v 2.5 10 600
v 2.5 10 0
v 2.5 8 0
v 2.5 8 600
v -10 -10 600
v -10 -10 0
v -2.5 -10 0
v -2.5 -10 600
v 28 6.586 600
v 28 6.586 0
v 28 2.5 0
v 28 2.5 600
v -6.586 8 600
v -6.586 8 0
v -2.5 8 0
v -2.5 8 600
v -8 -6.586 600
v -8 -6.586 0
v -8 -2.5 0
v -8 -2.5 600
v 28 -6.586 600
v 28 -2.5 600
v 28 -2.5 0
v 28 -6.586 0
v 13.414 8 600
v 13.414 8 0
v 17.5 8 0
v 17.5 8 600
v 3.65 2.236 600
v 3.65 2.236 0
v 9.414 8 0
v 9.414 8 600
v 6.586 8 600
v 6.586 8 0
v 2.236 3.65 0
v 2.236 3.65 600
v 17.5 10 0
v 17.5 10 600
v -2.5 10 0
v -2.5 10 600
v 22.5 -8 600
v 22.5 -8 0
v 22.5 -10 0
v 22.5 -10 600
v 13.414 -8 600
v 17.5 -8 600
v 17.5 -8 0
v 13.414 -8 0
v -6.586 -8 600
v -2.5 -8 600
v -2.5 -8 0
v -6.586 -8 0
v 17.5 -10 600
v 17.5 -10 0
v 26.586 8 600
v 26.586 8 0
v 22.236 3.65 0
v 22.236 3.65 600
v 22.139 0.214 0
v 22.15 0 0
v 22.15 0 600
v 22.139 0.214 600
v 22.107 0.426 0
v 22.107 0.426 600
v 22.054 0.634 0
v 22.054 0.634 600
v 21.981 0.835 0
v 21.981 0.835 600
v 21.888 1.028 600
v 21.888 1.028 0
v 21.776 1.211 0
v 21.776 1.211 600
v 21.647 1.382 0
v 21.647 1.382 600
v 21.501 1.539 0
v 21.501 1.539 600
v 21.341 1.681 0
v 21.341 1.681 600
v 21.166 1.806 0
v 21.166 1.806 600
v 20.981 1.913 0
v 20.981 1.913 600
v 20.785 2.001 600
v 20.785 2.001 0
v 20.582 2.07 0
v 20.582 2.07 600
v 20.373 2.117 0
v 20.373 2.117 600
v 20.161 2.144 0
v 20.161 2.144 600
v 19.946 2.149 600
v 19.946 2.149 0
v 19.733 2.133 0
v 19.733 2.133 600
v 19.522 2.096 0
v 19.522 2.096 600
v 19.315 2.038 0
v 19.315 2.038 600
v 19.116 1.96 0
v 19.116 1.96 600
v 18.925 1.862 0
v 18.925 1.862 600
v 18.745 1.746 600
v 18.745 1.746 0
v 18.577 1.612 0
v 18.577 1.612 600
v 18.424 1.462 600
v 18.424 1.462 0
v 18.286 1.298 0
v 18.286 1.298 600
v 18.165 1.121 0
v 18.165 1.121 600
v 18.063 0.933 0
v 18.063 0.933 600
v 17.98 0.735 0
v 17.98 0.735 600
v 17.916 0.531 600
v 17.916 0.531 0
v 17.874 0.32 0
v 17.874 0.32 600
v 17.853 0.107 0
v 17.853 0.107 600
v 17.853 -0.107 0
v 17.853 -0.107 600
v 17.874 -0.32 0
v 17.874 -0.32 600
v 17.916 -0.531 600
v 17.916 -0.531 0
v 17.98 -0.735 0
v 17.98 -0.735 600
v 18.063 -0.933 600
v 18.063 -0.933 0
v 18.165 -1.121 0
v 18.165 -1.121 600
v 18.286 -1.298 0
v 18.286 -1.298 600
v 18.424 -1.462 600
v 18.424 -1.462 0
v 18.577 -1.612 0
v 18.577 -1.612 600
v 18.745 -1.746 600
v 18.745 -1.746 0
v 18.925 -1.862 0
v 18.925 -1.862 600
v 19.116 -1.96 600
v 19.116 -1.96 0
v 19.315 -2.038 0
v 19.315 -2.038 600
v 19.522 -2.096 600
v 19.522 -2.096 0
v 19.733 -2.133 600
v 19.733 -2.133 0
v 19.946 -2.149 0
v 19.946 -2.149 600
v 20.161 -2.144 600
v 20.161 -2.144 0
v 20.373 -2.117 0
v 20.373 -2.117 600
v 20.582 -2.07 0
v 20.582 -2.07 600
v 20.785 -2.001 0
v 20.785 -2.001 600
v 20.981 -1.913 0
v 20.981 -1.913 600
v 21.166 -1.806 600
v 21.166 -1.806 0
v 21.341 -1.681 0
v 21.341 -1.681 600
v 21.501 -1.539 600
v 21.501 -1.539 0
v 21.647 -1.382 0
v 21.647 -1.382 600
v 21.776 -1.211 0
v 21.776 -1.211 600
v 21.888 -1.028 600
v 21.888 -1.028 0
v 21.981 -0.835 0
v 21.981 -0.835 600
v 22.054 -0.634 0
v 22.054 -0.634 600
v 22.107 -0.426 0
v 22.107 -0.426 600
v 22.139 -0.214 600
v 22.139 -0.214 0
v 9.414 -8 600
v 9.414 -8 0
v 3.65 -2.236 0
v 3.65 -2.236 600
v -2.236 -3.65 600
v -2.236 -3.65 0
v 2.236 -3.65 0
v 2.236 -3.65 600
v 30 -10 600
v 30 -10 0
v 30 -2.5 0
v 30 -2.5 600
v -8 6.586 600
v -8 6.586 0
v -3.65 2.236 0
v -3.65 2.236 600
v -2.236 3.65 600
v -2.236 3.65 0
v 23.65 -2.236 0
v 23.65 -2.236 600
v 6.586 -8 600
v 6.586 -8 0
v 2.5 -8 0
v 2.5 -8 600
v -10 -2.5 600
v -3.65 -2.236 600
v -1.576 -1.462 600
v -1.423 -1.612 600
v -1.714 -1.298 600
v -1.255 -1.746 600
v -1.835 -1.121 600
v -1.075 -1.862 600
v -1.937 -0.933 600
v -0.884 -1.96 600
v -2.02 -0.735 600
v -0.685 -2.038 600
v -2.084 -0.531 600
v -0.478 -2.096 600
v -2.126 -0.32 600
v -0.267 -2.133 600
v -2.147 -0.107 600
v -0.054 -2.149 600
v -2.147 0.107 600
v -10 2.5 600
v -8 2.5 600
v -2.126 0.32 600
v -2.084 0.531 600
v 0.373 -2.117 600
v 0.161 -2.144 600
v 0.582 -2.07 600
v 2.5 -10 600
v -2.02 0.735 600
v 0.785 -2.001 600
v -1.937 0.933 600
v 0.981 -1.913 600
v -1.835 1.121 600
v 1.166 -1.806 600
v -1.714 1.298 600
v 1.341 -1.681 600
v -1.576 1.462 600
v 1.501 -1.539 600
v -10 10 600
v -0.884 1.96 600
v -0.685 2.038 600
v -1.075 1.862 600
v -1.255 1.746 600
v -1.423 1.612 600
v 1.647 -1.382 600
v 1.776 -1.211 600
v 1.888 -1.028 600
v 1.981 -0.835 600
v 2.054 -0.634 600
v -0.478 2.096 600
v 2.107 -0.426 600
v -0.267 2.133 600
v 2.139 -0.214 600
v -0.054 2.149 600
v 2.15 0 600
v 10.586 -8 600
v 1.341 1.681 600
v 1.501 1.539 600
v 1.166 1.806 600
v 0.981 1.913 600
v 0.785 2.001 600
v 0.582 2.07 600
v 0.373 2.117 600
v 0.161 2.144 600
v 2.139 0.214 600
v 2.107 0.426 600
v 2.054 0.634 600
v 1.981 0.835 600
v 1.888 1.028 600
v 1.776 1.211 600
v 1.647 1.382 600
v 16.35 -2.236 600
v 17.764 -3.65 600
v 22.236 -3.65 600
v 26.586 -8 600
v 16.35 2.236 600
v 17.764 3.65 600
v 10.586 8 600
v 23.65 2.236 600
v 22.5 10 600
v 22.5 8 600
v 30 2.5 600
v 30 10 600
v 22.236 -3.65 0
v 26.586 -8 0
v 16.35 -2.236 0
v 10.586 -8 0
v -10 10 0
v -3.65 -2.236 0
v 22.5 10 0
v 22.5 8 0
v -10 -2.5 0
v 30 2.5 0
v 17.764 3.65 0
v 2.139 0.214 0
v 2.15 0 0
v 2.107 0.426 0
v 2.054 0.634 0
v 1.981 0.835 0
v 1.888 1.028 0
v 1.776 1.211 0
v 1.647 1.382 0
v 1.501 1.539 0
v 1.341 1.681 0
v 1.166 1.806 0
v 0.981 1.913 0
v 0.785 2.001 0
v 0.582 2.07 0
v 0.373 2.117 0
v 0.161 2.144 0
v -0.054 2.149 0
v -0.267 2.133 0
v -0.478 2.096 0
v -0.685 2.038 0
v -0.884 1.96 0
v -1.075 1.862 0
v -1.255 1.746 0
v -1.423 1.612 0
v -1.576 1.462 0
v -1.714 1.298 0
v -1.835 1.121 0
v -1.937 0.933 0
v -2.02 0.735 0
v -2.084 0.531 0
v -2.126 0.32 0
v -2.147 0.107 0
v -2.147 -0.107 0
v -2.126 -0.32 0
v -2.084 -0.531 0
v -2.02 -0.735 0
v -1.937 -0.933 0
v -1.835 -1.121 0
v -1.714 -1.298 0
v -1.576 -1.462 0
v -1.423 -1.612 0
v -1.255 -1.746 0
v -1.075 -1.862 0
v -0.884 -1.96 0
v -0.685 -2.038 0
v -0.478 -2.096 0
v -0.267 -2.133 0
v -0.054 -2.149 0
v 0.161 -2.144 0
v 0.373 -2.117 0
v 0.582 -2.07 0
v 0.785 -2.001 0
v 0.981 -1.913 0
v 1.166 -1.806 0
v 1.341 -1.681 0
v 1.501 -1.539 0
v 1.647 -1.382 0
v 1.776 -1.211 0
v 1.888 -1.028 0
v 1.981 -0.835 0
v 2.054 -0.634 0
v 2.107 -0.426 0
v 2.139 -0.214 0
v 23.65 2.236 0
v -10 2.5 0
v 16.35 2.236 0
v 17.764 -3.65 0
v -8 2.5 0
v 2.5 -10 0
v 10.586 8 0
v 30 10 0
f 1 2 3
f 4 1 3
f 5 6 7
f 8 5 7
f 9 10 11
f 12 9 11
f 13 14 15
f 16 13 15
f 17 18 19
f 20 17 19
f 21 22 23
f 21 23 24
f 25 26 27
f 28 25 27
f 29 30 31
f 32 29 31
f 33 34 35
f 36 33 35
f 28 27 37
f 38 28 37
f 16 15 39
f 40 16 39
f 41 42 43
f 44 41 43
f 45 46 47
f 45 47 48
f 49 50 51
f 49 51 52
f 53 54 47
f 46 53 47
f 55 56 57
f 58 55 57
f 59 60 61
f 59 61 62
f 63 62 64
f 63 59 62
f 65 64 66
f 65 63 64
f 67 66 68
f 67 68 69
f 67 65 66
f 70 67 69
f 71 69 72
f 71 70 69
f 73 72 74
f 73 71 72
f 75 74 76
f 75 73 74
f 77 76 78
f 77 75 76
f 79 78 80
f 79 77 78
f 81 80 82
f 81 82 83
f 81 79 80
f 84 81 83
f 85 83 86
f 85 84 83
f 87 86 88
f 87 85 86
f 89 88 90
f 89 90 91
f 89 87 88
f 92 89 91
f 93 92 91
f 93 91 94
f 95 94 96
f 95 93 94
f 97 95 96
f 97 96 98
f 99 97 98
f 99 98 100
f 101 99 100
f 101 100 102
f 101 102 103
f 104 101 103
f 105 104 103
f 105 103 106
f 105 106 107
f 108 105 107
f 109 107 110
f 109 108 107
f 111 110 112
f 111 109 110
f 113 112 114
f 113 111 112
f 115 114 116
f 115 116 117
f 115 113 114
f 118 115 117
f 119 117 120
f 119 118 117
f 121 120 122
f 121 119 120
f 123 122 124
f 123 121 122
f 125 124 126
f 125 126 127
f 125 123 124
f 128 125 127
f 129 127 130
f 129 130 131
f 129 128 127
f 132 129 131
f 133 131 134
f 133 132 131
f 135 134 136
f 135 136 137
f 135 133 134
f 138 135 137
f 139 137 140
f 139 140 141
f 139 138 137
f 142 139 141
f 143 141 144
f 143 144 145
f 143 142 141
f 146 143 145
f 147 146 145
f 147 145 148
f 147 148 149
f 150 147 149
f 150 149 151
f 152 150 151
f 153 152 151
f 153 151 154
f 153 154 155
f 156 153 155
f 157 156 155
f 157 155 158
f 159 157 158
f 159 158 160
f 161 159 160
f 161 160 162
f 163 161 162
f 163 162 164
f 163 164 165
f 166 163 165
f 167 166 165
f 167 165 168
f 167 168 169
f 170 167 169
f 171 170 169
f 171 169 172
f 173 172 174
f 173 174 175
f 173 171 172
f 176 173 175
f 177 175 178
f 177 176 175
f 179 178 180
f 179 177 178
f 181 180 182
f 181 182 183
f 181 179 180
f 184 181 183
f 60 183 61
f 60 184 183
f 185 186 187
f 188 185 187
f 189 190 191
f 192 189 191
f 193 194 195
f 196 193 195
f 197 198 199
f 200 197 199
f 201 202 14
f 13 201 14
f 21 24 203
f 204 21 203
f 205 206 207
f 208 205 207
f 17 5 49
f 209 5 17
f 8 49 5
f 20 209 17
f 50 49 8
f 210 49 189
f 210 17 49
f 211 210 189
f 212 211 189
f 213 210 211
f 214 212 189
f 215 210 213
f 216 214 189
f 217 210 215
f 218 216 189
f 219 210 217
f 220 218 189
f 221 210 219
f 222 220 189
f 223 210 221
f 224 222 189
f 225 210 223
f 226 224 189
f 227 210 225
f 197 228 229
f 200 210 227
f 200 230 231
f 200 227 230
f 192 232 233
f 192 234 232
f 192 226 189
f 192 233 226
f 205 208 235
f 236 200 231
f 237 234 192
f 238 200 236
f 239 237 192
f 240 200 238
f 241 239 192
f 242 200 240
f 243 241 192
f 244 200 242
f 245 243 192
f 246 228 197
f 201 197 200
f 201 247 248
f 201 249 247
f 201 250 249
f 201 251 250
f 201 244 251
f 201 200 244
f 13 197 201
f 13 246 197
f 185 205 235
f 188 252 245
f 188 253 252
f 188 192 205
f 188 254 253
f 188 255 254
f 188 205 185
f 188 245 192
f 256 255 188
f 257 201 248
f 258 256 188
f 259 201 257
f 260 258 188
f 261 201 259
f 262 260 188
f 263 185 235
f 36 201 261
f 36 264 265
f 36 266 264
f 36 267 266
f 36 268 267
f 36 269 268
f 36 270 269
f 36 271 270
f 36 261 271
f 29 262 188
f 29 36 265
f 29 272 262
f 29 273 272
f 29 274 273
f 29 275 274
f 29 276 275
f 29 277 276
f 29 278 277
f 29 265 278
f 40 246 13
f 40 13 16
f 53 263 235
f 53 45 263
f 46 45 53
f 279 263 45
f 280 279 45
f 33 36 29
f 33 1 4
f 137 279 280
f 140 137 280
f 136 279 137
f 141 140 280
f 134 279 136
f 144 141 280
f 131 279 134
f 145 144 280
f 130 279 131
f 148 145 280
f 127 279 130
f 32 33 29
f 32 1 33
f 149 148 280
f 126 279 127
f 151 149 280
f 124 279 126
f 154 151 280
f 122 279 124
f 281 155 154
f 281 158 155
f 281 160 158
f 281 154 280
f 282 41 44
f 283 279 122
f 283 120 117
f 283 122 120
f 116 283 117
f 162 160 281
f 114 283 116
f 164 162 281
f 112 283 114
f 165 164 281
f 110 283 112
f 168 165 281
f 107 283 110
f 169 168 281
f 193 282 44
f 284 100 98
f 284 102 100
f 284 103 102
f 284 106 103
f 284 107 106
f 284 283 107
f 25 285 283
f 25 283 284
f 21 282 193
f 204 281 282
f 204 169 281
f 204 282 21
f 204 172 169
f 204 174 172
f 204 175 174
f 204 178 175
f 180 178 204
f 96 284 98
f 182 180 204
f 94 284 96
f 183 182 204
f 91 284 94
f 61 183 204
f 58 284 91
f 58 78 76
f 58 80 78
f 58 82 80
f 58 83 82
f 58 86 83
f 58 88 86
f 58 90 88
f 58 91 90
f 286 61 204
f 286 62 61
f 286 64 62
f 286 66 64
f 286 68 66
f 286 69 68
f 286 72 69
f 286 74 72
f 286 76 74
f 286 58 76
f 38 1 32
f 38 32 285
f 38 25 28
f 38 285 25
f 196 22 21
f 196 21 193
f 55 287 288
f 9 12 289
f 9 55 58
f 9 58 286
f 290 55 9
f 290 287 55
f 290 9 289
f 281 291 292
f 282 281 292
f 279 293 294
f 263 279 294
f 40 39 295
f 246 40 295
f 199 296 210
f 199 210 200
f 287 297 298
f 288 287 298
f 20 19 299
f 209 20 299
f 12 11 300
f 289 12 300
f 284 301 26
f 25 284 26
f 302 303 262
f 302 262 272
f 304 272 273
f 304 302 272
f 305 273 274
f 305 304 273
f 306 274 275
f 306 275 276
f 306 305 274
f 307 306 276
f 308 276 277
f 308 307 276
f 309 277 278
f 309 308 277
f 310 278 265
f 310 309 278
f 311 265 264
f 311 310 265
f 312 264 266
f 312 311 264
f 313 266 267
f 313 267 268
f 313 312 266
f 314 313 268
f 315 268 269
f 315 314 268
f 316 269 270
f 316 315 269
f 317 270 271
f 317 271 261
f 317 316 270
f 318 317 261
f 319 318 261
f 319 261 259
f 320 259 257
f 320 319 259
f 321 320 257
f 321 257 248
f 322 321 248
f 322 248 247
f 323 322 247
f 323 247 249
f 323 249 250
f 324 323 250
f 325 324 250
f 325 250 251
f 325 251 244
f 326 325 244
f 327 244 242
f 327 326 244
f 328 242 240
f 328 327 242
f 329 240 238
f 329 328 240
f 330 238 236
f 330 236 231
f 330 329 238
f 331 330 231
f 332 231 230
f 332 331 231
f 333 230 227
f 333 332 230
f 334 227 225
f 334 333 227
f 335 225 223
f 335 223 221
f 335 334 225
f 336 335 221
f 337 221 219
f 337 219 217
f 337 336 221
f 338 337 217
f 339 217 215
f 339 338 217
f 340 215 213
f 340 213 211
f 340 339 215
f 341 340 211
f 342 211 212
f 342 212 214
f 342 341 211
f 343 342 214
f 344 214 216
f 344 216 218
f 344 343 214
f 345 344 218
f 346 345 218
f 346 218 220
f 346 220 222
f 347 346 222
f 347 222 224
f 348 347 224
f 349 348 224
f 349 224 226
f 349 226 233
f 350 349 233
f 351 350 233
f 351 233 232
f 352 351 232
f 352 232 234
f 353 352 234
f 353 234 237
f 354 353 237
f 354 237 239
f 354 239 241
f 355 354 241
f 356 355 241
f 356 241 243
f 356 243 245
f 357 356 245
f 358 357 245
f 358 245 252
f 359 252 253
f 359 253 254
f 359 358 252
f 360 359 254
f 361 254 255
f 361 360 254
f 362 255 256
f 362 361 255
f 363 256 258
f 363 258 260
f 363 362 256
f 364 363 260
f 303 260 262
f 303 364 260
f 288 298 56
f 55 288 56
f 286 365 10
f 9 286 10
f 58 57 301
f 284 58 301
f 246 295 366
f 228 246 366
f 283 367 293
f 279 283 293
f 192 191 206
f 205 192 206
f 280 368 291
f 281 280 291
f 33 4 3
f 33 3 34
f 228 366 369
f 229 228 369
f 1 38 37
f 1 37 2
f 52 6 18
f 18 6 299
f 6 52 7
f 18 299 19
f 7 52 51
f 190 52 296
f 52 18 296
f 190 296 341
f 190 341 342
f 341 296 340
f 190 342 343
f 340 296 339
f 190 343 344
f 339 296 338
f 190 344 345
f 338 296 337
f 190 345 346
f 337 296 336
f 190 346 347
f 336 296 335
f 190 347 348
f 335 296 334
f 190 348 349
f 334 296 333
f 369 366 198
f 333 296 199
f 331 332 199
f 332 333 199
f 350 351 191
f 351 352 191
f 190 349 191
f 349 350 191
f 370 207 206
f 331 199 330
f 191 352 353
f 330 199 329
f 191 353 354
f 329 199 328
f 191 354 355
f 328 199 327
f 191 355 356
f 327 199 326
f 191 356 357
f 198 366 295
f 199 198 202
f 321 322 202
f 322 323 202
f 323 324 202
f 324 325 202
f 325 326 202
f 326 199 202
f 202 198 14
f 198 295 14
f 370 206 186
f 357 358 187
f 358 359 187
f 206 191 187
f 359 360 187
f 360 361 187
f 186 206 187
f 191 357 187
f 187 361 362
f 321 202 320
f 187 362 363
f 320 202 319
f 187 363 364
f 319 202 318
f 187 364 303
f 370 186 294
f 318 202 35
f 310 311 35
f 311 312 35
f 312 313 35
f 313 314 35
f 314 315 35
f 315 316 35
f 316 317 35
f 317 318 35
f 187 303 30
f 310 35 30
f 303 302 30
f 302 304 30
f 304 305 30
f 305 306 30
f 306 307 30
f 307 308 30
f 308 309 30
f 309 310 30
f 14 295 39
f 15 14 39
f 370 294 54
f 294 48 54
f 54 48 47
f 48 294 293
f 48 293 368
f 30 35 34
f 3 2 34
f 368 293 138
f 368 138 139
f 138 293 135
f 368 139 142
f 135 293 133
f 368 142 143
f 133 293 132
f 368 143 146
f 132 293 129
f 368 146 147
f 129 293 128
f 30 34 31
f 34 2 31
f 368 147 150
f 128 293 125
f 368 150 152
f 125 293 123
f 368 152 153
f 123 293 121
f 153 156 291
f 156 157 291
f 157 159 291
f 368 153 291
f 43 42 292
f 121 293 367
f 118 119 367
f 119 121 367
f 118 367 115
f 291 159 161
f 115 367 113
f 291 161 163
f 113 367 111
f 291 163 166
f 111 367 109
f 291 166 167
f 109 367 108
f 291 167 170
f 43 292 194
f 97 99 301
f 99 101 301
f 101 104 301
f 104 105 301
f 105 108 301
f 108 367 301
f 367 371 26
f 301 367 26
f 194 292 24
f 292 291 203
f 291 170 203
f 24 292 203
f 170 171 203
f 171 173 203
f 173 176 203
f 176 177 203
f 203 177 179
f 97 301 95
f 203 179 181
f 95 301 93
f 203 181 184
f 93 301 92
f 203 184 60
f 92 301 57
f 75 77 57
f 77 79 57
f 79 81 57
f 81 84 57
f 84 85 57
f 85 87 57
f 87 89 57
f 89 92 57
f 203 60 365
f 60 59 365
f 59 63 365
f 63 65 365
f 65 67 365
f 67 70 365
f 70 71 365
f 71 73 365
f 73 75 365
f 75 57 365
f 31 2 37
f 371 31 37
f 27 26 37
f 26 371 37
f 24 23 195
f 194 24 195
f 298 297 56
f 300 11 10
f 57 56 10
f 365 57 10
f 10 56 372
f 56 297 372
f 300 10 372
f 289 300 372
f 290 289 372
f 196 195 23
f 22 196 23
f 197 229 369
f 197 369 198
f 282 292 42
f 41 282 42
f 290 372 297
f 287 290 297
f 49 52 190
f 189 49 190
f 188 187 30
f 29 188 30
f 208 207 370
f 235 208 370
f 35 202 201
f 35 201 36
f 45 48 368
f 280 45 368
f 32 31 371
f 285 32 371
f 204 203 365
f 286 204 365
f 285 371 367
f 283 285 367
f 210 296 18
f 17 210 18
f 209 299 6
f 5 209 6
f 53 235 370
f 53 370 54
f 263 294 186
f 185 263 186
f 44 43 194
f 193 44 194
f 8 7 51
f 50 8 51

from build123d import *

# Parameters (mm, degrees)
ESQUISSE1_W        = 7.3
ESQUISSE1_H        = 7.3
ESQUISSE1_R        = 2.15
BOSS_EXTRU_2_DEPTH = 600


with BuildPart() as part:
    # Esquisse1 → Boss.-Extru.2 (new body)
    with BuildSketch(Plane.XY):
        Polygon((-8, -2.5), (-10, -2.5), (-10, -10), (-2.5, -10), (-2.5, -8), (-6.585786438, -8), (-2.235786438, -3.65), (-3.65, -3.65), (-3.65, -2.235786438), (-8, -6.585786438), align=None)
        Polygon((2.5, -8), (2.5, -10), (10, -10), (10, -8), (9.414213562, -8), (8, -6.585786438), (3.65, -2.235786438), (3.65, -3.65), (2.235786438, -3.65), (6.585786438, -8), align=None)
        Rectangle(ESQUISSE1_W, ESQUISSE1_H)
        Circle(ESQUISSE1_R, mode=Mode.SUBTRACT)
        Polygon((10, 10), (2.5, 10), (2.5, 8), (6.585786438, 8), (2.235786438, 3.65), (3.65, 3.65), (3.65, 2.235786438), (8, 6.585786438), (9.414213562, 8), (10, 8), align=None)
        Polygon((17.5, 10), (10, 10), (10, 8), (10.585786438, 8), (12, 6.585786438), (16.35, 2.235786438), (16.35, 3.65), (17.764213562, 3.65), (13.414213562, 8), (17.5, 8), align=None)
        Polygon((-2.5, 10), (-10, 10), (-10, 2.5), (-8, 2.5), (-8, 6.585786438), (-3.65, 2.235786438), (-3.65, 3.65), (-2.235786438, 3.65), (-6.585786438, 8), (-2.5, 8), align=None)
        Polygon((10, -8), (10, -10), (17.5, -10), (17.5, -8), (13.414213562, -8), (17.764213562, -3.65), (16.35, -3.65), (16.35, -2.235786438), (12, -6.585786438), (10.585786438, -8), align=None)
        Polygon((22.235786438, 3.65), (17.764213562, 3.65), (16.35, 3.65), (16.35, 2.235786438), (16.35, -2.235786438), (16.35, -3.65), (17.764213562, -3.65), (22.235786438, -3.65), (23.65, -3.65), (23.65, -2.235786438), (23.65, 2.235786438), (23.65, 3.65), align=None)
        with Locations((20, 0)):
            Circle(ESQUISSE1_R, mode=Mode.SUBTRACT)
        Polygon((30, 10), (22.5, 10), (22.5, 8), (26.585786438, 8), (22.235786438, 3.65), (23.65, 3.65), (23.65, 2.235786438), (28, 6.585786438), (28, 2.5), (30, 2.5), align=None)
        Polygon((30, -10), (30, -2.5), (28, -2.5), (28, -6.585786438), (23.65, -2.235786438), (23.65, -3.65), (22.235786438, -3.65), (26.585786438, -8), (22.5, -8), (22.5, -10), align=None)
    extrude(amount=BOSS_EXTRU_2_DEPTH)


solid = part.part
